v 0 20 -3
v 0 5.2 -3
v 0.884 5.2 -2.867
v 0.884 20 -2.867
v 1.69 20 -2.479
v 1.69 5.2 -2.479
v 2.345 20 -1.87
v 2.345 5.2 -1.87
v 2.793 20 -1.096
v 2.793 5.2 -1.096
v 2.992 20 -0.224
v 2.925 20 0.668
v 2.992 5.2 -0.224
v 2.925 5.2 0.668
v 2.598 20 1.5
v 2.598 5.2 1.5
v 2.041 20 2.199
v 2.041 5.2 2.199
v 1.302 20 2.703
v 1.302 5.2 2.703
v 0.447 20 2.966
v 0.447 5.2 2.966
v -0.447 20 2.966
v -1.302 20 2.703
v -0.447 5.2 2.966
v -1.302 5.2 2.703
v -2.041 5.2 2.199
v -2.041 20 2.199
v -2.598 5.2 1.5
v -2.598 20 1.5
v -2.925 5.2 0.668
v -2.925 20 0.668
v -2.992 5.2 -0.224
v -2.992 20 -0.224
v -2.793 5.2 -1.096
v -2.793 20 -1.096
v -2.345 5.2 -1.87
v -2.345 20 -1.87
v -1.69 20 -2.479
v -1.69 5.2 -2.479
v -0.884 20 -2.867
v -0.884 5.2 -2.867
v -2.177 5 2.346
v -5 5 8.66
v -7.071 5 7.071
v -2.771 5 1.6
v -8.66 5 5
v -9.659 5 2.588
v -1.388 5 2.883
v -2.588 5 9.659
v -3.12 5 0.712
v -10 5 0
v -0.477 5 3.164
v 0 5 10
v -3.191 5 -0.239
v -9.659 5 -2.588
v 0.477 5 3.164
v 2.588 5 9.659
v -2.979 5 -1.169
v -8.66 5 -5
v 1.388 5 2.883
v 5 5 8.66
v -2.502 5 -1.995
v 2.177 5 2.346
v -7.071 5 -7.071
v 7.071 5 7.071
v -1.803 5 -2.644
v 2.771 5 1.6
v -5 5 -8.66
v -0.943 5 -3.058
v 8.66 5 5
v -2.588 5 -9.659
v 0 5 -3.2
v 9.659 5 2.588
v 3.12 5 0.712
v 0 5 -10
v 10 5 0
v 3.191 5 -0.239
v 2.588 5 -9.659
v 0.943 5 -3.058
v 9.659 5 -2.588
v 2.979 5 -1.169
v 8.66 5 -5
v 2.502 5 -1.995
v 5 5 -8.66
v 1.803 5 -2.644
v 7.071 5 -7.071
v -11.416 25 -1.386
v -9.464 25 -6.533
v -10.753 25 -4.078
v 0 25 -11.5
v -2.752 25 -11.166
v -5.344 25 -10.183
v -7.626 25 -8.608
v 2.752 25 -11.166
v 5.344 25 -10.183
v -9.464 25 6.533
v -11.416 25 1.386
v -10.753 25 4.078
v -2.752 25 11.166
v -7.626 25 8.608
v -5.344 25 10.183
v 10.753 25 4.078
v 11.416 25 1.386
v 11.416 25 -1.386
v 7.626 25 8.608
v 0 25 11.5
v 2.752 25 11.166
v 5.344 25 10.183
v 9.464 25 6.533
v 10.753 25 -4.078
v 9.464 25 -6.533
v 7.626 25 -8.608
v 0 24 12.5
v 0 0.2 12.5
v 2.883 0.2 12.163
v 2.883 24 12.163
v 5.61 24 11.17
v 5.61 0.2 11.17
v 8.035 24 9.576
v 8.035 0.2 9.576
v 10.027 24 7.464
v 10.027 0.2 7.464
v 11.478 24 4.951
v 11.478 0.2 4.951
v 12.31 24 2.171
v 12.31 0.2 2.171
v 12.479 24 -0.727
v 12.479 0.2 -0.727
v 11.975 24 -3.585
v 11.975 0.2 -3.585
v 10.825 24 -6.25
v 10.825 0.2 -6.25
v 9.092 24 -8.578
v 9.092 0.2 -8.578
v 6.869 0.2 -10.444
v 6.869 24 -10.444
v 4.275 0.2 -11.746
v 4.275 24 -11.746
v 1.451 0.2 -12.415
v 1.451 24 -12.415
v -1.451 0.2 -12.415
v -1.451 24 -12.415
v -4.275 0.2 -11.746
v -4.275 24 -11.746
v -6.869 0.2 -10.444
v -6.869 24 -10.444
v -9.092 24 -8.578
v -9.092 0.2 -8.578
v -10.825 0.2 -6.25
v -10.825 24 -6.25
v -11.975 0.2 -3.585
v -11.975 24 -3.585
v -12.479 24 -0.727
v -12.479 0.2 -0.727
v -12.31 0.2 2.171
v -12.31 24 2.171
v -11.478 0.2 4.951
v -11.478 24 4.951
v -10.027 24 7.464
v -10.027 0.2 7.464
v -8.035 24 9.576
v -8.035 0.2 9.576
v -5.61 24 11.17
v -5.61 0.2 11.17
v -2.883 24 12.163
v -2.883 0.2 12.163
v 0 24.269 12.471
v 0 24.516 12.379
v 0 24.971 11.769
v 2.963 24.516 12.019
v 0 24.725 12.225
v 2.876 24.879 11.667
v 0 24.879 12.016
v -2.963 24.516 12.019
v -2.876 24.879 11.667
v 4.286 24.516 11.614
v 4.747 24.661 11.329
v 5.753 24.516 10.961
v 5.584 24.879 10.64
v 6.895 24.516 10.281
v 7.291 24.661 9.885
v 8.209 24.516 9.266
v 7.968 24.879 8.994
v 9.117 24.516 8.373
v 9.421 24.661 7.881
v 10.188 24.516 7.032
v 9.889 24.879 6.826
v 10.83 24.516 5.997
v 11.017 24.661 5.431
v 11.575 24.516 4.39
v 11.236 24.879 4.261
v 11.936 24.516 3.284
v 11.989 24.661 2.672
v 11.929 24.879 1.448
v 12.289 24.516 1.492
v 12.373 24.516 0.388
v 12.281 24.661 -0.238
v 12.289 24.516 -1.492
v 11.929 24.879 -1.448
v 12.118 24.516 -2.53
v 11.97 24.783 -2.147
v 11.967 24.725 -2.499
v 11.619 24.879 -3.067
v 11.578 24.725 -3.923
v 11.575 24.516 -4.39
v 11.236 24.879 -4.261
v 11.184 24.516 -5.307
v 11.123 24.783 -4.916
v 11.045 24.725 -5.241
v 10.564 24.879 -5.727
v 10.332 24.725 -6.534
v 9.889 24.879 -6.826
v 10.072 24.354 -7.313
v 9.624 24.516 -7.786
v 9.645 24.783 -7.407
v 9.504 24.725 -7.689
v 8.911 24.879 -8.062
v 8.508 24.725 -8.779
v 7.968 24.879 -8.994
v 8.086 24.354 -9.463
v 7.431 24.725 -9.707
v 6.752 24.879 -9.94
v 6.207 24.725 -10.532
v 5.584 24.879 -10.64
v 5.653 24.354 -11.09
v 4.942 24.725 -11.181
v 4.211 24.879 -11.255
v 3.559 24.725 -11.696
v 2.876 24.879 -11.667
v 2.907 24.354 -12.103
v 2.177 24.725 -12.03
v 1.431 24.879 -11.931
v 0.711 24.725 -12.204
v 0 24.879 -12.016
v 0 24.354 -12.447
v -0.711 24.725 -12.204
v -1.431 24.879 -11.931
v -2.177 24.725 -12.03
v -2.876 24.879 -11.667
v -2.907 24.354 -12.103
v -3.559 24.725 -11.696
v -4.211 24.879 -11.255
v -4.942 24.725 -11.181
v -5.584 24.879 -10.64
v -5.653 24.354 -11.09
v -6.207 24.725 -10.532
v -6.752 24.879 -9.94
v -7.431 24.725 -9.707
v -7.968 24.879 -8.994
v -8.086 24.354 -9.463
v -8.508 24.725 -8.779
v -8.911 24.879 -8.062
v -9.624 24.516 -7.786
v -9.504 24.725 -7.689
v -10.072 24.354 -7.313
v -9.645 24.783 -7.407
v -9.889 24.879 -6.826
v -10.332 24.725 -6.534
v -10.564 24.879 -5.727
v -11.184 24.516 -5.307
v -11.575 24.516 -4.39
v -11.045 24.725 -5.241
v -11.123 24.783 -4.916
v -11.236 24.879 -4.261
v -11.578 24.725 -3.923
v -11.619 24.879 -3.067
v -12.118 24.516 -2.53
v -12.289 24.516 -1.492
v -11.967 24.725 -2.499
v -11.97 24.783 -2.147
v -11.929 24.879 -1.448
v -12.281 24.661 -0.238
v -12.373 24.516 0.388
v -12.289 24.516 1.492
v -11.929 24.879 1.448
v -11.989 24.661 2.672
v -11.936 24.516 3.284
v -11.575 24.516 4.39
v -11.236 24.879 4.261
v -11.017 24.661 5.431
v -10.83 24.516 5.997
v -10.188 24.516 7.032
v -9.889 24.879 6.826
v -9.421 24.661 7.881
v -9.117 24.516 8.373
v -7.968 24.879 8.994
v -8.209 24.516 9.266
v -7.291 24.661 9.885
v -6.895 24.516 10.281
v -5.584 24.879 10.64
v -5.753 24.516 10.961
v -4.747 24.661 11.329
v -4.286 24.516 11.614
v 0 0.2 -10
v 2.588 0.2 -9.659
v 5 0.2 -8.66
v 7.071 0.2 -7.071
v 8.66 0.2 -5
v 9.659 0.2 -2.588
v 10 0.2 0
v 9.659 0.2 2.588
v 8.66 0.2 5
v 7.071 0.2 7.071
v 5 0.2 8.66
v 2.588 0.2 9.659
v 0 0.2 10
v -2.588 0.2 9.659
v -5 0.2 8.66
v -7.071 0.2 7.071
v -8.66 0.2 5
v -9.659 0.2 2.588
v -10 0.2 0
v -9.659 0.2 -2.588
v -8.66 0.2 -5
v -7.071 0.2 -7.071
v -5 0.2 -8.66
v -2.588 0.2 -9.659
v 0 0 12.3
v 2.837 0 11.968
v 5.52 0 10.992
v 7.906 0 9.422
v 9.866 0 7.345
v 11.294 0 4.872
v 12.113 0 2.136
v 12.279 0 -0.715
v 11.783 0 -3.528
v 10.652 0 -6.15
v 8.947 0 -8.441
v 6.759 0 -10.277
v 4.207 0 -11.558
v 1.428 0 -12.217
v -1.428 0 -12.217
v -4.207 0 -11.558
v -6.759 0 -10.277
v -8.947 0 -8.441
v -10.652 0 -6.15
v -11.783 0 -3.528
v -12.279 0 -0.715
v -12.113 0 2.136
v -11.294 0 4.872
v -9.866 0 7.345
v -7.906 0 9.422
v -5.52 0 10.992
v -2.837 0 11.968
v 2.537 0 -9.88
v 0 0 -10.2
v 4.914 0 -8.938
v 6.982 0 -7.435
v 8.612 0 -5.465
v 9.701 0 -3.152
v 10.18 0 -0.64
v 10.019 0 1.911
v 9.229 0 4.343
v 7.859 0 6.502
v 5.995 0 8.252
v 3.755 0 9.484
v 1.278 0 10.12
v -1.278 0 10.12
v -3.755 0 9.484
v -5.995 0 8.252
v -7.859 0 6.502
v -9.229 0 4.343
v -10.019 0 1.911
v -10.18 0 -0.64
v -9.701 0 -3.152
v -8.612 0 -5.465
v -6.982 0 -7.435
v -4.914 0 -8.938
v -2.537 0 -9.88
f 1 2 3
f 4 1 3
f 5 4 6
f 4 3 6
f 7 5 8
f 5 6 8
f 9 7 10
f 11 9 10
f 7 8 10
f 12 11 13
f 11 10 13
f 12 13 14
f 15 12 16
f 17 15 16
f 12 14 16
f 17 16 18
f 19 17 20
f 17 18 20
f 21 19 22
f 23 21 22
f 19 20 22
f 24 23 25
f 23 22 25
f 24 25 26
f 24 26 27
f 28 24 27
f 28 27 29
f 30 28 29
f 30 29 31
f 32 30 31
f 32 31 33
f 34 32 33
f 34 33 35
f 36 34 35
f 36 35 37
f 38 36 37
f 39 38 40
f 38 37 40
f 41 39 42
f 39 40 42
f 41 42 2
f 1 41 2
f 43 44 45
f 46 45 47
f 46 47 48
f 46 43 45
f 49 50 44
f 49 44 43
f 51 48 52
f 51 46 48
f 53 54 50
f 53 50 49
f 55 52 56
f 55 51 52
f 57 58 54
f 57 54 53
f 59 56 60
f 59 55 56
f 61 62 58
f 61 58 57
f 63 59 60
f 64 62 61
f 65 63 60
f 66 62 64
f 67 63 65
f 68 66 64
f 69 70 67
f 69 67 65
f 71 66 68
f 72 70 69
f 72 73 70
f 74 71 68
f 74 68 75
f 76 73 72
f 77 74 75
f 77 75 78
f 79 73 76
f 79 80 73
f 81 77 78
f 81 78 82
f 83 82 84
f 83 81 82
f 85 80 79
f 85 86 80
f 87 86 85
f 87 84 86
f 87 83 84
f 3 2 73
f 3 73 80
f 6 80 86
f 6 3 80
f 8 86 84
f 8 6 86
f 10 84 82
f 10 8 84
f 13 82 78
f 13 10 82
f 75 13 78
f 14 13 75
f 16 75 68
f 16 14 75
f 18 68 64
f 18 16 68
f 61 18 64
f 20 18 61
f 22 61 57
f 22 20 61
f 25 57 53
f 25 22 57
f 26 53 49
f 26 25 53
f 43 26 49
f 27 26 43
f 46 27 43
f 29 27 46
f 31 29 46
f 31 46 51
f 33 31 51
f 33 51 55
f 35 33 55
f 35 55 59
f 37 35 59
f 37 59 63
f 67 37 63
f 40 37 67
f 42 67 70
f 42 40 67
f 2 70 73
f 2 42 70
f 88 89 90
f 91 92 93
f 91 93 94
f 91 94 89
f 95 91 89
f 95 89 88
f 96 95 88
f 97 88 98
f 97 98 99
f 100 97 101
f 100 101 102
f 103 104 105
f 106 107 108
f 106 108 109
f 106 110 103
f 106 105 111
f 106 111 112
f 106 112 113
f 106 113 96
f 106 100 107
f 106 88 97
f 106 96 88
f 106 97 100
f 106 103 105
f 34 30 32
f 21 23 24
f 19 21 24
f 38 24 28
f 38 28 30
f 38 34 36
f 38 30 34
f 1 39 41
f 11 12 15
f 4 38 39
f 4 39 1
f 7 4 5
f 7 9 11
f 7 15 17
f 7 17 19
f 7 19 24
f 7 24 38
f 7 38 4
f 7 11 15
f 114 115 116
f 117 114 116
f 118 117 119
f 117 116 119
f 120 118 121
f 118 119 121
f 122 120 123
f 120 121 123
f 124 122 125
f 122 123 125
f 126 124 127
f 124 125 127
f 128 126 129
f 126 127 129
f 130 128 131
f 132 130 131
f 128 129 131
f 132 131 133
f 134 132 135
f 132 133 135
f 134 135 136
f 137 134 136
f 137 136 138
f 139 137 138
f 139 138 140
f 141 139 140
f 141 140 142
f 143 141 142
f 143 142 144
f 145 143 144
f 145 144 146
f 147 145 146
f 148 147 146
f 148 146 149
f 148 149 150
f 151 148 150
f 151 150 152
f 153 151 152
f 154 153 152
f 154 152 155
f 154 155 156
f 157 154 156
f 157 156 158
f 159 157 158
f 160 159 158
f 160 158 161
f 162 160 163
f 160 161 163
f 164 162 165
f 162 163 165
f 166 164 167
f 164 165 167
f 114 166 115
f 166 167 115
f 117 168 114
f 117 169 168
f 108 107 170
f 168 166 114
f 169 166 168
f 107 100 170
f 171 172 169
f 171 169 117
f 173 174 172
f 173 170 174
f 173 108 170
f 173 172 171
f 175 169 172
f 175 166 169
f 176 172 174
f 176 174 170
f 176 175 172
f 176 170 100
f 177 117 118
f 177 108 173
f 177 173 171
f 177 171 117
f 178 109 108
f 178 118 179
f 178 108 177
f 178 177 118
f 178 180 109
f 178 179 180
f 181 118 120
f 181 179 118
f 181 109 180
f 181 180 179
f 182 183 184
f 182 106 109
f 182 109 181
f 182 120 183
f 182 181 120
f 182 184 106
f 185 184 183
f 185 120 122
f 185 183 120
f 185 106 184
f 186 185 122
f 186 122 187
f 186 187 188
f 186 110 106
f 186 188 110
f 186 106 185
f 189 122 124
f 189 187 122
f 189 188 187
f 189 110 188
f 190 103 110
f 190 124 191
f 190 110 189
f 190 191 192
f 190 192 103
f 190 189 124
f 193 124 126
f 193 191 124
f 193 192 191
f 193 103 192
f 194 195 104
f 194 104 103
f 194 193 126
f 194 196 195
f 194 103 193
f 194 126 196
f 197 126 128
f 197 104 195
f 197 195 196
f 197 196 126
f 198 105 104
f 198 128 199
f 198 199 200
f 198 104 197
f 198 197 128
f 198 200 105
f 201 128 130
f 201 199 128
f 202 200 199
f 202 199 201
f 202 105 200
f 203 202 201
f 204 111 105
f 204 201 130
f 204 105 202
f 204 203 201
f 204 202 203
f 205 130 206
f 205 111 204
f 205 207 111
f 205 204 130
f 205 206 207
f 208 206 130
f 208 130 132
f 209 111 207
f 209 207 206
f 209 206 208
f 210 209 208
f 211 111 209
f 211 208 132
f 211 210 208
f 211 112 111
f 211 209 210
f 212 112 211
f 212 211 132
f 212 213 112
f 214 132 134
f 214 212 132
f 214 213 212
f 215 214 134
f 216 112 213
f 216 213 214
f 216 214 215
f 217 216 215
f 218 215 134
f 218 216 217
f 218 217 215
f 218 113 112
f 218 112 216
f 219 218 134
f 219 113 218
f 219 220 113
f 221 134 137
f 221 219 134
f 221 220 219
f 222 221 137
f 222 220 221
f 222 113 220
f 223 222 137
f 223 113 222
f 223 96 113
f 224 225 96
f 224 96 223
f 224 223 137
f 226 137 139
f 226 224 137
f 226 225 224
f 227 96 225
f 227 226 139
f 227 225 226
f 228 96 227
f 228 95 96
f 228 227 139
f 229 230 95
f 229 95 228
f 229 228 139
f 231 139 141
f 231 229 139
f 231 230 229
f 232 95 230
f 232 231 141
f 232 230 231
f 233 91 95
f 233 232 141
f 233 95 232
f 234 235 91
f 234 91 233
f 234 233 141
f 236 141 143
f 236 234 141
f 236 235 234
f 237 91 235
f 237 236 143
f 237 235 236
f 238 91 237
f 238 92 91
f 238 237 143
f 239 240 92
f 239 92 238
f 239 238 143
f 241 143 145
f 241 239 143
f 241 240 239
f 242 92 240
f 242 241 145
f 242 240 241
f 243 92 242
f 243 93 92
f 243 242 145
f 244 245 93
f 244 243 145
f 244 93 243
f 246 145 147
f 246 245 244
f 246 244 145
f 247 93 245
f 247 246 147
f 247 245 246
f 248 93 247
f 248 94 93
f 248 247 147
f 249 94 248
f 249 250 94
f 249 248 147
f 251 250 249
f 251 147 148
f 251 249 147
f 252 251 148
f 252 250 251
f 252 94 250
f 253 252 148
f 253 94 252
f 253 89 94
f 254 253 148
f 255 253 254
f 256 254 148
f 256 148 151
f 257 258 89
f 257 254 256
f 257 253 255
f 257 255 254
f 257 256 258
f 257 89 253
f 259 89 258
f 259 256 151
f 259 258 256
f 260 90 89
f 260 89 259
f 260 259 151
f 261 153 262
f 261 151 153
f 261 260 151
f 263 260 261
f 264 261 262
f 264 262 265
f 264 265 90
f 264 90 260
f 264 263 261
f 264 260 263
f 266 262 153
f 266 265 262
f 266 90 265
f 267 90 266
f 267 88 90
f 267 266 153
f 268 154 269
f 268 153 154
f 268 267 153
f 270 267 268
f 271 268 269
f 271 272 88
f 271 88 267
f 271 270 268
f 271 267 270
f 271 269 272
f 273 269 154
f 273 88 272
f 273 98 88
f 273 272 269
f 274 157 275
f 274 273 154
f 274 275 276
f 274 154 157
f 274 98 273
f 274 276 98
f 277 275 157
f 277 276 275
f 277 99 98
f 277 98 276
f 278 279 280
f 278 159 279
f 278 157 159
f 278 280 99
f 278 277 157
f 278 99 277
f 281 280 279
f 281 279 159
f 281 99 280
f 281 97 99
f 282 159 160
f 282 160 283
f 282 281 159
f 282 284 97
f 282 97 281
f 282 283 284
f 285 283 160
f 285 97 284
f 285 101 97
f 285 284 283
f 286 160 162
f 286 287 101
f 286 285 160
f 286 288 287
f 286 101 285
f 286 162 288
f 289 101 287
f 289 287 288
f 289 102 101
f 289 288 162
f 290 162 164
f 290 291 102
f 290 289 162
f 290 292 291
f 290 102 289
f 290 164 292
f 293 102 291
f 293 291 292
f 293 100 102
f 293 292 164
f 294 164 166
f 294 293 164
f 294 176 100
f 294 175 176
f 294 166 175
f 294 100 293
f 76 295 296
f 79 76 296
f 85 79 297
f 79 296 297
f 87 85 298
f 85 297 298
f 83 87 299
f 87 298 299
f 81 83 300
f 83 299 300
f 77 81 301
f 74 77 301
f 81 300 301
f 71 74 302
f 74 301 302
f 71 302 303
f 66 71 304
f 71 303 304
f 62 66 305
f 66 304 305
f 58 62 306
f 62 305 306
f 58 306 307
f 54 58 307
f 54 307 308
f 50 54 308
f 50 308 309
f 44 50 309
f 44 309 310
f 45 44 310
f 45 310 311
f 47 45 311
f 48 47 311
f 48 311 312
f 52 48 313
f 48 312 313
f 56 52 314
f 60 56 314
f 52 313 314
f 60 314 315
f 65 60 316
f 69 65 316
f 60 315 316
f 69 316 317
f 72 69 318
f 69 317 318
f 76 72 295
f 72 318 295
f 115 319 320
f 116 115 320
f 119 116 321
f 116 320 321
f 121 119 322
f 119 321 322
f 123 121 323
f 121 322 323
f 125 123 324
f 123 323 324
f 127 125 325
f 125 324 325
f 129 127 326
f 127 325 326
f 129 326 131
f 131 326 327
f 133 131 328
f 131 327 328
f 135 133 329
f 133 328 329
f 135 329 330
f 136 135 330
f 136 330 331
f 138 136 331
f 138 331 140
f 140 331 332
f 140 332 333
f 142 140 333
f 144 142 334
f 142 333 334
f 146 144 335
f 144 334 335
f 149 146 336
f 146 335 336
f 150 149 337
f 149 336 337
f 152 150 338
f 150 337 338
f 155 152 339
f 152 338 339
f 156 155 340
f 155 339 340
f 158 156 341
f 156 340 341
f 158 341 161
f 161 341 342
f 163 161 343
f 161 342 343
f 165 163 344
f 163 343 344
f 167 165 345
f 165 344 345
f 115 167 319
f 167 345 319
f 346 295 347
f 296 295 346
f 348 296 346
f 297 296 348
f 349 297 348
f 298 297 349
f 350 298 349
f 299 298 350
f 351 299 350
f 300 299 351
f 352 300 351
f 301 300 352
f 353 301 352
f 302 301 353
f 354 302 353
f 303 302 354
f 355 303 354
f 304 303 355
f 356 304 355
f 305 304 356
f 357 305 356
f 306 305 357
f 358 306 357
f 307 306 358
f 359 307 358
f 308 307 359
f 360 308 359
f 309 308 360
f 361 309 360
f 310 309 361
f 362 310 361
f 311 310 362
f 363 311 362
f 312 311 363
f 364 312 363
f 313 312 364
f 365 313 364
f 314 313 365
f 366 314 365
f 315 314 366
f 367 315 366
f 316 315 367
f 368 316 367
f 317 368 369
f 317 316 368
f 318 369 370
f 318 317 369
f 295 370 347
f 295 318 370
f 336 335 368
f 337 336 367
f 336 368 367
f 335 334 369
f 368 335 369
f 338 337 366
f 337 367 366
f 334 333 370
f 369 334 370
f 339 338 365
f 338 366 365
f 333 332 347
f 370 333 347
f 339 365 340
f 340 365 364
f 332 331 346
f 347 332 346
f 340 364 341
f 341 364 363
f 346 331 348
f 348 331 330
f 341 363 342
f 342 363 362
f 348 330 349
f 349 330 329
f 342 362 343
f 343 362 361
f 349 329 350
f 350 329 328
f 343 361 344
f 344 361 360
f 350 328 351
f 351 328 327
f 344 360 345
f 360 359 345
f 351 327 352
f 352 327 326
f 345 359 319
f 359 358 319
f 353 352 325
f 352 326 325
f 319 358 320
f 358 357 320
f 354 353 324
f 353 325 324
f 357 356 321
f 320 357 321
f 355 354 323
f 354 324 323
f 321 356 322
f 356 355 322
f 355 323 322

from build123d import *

# Parameters (mm, degrees)
SKETCH_1_R          = 12.5
EXTRUDE_1_DEPTH     = 25
SKETCH_2_R          = 10
CUT_EXTRUDE_1_DEPTH = 5
SKETCH_3_R          = 3
CUT_EXTRUDE_2_DEPTH = 15
CHAMFER_1_SIZE      = 0.2
FILLET_1_SIZE       = 1


with BuildPart() as part:
    # 草图1 → 凸台-拉伸1 (new body)
    with BuildSketch(Plane(origin=(0, 0, 0), x_dir=(1, 0, 0), z_dir=(0, 1, 0))):
        with Locations(Location((0, 0, 0), (0, 0, 270))):
            Circle(SKETCH_1_R)
    extrude(amount=EXTRUDE_1_DEPTH)

    # 草图2 → 切除-拉伸1 (cut)
    with BuildSketch(Plane.XZ):
        with Locations(Location((0, 0, 0), (0, 0, 270))):
            Circle(SKETCH_2_R)
    extrude(amount=-CUT_EXTRUDE_1_DEPTH, mode=Mode.SUBTRACT)

    # 草图3 → 切除-拉伸2 (cut)
    with BuildSketch(Plane.XZ.offset(-5)):
        with Locations(Location((0, 0, 0), (0, 0, 270))):
            Circle(SKETCH_3_R)
    extrude(amount=-CUT_EXTRUDE_2_DEPTH, mode=Mode.SUBTRACT)

    # 倒角1
    chamfer_1_edges = [part.edges().sort_by_distance(p)[0] for p in [
        (0, 5, 3),
        (0, 0, -12.5),
        (0, 0, 10),
    ]]
    chamfer(chamfer_1_edges, length=CHAMFER_1_SIZE)

    # 圆角1
    # a fillet whose section is not a circle: 1 mm, written as the material it takes off along each edge
    with BuildSketch(Plane(origin=(0, 25, 0), x_dir=(0, 0, 1), z_dir=(-1, 0, 0))) as fillet_1_piece_1:
        with BuildLine():
            Bezier((12.5, -FILLET_1_SIZE), (12.5, 0), (12.5 - FILLET_1_SIZE, 0), weights=[1, 0.818181818, 1])
            Line((12.5 - FILLET_1_SIZE, 0), (12.5, 0))
            Line((12.5, 0), (12.5, -FILLET_1_SIZE))
        make_face()
    revolve(axis=Axis((0, 25, 0), (0, 1, 0)), mode=Mode.SUBTRACT)


solid = part.part
